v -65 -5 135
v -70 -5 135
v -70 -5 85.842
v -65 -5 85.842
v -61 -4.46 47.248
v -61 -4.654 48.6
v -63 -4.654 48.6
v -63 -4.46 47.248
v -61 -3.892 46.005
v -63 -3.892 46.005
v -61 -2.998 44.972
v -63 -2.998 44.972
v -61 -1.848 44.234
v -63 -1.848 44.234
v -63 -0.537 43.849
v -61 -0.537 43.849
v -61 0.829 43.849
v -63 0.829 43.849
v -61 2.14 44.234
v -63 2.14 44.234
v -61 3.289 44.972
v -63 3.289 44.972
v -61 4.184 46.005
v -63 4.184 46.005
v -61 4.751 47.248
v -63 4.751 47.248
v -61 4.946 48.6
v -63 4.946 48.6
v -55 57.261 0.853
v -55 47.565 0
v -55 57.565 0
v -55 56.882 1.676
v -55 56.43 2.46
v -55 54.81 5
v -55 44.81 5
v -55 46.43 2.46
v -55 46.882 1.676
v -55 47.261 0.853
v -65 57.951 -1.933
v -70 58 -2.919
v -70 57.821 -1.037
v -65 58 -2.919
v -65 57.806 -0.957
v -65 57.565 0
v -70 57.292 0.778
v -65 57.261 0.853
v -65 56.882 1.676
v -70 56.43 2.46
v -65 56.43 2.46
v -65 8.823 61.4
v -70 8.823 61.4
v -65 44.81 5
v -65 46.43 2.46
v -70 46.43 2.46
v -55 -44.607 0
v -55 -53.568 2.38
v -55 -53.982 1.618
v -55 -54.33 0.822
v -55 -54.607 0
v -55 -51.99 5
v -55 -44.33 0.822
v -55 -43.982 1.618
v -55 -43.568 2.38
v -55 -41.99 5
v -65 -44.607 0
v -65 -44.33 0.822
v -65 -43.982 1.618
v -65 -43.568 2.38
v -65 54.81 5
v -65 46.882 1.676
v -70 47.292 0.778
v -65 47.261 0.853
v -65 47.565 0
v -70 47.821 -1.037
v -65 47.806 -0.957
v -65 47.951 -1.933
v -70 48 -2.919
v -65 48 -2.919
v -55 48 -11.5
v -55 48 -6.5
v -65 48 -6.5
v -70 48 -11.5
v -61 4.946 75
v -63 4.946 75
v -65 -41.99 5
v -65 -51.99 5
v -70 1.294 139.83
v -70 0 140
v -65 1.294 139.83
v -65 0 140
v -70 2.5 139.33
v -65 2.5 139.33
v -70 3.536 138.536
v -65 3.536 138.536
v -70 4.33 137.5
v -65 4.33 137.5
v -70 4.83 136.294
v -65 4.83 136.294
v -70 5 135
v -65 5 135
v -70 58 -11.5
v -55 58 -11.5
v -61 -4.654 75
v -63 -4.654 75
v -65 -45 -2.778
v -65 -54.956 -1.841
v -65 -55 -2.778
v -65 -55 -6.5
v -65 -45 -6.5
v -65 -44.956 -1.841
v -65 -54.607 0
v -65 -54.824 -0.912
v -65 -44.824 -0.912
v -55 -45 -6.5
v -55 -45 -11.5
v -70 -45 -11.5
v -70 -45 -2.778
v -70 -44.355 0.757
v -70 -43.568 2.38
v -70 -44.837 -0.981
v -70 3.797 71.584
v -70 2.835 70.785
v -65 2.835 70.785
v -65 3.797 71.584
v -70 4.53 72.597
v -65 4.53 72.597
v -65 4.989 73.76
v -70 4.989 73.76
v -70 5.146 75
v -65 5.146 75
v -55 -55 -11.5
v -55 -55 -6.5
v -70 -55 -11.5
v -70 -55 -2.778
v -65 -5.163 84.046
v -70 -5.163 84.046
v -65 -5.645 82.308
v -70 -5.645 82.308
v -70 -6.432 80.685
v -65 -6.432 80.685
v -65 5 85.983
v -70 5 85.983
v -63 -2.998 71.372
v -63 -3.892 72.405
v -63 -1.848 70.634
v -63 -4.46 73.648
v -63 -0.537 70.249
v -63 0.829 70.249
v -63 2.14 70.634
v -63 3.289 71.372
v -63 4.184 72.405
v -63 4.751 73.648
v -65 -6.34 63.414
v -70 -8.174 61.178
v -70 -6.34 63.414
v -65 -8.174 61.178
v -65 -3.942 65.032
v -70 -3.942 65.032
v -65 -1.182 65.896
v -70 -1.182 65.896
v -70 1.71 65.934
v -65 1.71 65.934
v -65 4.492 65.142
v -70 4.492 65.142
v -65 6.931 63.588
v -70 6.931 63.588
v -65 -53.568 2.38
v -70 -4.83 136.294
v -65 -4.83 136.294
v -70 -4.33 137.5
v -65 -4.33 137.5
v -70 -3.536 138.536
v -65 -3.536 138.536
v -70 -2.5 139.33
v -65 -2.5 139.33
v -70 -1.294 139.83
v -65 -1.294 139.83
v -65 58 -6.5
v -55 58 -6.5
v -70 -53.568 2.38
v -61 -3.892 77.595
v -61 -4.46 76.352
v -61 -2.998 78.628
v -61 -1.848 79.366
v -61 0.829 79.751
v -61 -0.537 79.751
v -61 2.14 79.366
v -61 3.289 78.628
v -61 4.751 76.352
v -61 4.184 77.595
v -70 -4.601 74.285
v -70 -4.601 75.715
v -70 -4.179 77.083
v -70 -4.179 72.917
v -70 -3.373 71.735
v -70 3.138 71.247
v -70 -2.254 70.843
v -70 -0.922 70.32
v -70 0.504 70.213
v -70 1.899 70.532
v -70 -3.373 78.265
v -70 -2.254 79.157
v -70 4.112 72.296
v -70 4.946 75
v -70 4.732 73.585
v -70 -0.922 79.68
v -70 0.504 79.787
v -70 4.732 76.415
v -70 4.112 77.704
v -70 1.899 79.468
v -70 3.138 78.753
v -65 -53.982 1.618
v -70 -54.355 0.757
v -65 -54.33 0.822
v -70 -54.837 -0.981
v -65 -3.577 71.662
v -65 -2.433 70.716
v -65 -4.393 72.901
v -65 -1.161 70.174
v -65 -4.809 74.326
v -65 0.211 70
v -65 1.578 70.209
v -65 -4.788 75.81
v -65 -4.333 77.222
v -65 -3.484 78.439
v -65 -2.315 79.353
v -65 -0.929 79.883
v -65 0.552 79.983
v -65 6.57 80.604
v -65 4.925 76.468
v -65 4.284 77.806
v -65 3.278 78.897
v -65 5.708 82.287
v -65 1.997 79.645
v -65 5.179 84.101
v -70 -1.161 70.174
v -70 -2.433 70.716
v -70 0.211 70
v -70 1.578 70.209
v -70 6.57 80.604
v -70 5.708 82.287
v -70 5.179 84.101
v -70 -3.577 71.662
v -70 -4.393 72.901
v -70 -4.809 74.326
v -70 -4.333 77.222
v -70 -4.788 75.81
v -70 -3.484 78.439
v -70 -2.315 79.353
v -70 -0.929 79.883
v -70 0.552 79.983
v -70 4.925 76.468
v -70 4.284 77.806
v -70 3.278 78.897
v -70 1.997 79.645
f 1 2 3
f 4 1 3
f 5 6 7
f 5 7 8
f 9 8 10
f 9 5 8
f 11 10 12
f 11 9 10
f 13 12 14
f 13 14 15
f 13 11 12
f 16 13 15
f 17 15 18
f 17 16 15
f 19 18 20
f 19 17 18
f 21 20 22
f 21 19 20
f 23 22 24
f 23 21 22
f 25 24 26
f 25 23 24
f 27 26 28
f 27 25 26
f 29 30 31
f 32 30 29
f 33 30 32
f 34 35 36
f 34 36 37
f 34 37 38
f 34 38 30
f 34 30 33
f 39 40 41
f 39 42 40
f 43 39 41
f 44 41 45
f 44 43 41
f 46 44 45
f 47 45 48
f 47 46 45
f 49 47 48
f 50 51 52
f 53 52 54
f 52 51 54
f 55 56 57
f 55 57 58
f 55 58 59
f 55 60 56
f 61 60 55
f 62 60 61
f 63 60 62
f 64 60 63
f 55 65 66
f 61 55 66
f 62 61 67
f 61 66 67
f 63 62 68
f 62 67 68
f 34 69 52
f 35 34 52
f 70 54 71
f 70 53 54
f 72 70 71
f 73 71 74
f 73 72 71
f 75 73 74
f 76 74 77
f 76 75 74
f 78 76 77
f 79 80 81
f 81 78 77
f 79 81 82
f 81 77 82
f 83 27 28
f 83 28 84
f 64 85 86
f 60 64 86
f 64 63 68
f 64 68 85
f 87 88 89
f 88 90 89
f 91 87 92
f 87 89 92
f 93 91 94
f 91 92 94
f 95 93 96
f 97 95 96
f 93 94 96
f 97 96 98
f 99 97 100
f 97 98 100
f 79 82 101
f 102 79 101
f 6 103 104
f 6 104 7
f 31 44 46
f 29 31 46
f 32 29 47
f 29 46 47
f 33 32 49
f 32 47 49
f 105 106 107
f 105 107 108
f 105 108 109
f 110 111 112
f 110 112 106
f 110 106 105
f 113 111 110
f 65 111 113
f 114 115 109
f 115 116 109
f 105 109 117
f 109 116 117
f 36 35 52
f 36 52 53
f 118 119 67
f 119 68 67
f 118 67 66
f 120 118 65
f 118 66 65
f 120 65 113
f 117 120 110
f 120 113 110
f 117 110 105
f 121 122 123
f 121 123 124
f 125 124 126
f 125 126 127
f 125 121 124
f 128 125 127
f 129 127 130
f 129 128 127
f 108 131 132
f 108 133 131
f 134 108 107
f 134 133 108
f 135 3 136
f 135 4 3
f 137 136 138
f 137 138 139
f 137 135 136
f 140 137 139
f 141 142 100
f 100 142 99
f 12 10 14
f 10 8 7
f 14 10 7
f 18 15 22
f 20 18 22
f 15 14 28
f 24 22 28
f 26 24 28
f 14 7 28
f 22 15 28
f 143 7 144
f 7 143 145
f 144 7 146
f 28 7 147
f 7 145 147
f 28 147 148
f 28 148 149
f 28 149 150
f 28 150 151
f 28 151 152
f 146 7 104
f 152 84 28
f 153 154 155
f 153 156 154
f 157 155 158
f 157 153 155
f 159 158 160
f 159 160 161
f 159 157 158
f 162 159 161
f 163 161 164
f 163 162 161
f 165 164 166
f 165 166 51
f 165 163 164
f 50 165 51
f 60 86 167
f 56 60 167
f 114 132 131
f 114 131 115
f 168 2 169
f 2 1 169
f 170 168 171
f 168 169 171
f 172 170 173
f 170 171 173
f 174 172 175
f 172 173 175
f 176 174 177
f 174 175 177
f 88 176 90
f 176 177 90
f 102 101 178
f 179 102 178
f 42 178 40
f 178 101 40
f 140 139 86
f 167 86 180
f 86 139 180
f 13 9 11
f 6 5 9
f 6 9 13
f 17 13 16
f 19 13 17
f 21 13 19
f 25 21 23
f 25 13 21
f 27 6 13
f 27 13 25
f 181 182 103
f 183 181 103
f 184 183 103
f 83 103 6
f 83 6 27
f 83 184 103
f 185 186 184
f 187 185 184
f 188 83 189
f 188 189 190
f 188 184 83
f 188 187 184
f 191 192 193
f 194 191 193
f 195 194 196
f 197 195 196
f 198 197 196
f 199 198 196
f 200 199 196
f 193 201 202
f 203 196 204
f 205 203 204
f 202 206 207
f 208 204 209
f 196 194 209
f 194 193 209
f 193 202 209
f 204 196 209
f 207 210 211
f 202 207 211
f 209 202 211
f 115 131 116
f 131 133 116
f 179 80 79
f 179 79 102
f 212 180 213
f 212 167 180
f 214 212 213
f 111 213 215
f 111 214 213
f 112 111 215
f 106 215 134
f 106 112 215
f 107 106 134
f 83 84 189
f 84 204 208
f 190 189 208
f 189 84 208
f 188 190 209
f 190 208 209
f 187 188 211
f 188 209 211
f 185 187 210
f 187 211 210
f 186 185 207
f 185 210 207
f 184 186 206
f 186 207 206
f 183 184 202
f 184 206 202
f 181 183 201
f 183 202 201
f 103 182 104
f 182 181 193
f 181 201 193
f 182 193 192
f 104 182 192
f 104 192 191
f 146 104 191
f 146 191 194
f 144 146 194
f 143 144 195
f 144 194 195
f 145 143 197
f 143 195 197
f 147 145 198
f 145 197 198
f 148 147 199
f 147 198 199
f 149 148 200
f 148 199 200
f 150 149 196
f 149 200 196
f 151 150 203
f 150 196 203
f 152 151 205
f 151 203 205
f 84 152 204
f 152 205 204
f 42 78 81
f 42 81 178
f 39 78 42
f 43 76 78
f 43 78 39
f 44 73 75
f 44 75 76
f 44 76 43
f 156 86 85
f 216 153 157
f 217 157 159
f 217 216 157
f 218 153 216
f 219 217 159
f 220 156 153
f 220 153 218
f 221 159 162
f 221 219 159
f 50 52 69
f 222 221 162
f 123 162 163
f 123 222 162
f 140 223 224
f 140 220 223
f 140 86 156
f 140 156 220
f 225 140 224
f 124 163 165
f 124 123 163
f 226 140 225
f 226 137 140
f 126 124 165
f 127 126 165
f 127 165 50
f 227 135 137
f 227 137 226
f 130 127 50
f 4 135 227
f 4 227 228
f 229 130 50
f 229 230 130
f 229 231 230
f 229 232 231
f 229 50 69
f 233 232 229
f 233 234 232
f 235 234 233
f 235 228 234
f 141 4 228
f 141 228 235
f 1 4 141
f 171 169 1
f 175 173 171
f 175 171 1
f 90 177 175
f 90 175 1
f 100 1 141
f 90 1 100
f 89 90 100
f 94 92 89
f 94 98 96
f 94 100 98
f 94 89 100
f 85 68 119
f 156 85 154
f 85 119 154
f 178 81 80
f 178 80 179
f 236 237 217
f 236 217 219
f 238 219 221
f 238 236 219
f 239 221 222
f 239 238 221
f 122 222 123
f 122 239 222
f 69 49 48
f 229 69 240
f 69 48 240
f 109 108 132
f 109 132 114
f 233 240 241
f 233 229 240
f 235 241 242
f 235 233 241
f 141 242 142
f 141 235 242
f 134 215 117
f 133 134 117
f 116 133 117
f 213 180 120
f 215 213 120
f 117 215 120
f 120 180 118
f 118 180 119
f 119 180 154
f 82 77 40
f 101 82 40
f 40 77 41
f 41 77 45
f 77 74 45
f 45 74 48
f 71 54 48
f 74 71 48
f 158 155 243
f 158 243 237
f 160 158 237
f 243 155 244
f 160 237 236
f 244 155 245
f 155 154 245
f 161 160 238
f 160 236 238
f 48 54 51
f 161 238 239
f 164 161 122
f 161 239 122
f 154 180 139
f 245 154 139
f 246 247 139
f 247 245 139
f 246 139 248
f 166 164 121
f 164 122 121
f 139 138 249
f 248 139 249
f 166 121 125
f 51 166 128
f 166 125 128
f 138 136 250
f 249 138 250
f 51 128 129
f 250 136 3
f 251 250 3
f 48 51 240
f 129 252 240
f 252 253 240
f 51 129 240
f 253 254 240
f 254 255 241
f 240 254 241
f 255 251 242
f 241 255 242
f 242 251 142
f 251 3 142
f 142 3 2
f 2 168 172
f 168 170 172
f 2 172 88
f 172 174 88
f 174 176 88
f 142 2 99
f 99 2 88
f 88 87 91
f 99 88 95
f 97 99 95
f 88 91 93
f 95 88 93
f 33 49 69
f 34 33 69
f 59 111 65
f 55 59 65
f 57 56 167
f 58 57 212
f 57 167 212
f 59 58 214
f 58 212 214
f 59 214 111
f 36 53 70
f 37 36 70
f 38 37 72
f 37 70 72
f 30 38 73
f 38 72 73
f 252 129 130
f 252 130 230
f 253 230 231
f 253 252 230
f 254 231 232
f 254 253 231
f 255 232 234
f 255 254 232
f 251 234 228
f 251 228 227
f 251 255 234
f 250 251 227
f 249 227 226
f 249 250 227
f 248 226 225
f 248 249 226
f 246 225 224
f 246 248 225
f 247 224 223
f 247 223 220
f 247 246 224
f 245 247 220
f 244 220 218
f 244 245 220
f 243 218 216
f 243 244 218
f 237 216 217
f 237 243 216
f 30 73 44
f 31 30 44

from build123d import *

# Parameters (mm, degrees)
F2_DEPTH  = 5
F3_R      = 10
F4_R      = 4.99999
F5_W      = 10
F5_H      = 5
F6_DEPTH  = 10
F8_DEPTH  = 5
F9_R      = 4.8
F10_DEPTH = 9
F12_DEPTH = 2


# Not quite as in the source:
# - a fillet or chamfer is up to 0.001 mm smaller than in the source, because OpenCascade refuses the exact size


with BuildPart() as f2:
    # F1 (on offset) → F2 (new body)
    with BuildSketch(Plane.YZ.offset(-70)):
        Polygon((-45, 0), (0.145631068, 75), (48, 0), (48, -11.5), (58, -11.5), (58, 0), (5, 83.064516129), (5, 140), (0, 140), (-5, 140), (-5, 83.064516129), (-55, 0), (-55, -11.5), (-45, -11.5), align=None)
    extrude(amount=F2_DEPTH)

    # F3
    f3_edges = [f2.edges().sort_by_distance(p)[0] for p in [
        (-67.5, -55, 0),
        (-67.5, 48, 0),
        (-67.5, 0.145631, 75),
        (-67.5, 5, 83.064516),
        (-67.5, -5, 83.064516),
        (-67.5, 58, 0),
        (-67.5, -45, 0),
    ]]
    fillet(f3_edges, radius=F3_R)

    # F4 (radius 5 in the source; OpenCascade refuses exactly that, so slightly less here)
    f4_edges = [f2.edges().sort_by_distance(p)[0] for p in [
        (-67.5, -5, 140),
        (-67.5, 5, 140),
    ]]
    fillet(f4_edges, radius=F4_R)

    # F5 (on face) → F6 (join)
    with BuildSketch(Plane.YZ.offset(-65)):
        with Locations((-50, -9)):
            Rectangle(F5_W, F5_H)
        with Locations((53, -9)):
            Rectangle(F5_W, F5_H)
        with BuildLine():
            ThreePointArc((-53.5675810852, 2.379663681), (-54.16461993, 1.2236964571), (-54.6065278232, 0))
            Line((-54.6065278232, 0), (-44.6065278232, 0))
            ThreePointArc((-44.6065278232, 0), (-44.16461993, 1.2236964571), (-43.5675810852, 2.379663681))
            Line((-43.5675810852, 2.379663681), (-41.9902912621, 5))
            Line((-41.9902912621, 5), (-51.9902912621, 5))
            Line((-51.9902912621, 5), (-53.5675810852, 2.379663681))
        make_face()
        with BuildLine():
            Line((54.8097087379, 5), (44.8097087379, 5))
            Line((44.8097087379, 5), (46.4301381012, 2.4603739436))
            ThreePointArc((46.4301381012, 2.4603739436), (47.0810932515, 1.2687862909), (47.5646272105, 0))
            Line((47.5646272105, 0), (57.5646272105, 0))
            ThreePointArc((57.5646272105, 0), (57.0810932515, 1.2687862909), (56.4301381012, 2.4603739436))
            Line((56.4301381012, 2.4603739436), (54.8097087379, 5))
        make_face()
    extrude(amount=F6_DEPTH)

    # F7 (on face) → F8 (cut, through all)
    with BuildSketch(Plane.YZ.offset(-70)):
        with BuildLine():
            ThreePointArc((2.8350906603, 70.7849309494), (4.5301092559, 72.5965959517), (5.145631068, 75))
            ThreePointArc((5.145631068, 75), (-2.3147589593, 79.3527555541), (-2.4329612975, 70.7162094574))
            Line((-2.4329612975, 70.7162094574), (0.145631068, 75))
            Line((0.145631068, 75), (2.8350906603, 70.7849309494))
        make_face()
        with BuildLine():
            Line((0.145631068, 75), (-2.4329612975, 70.7162094574))
            ThreePointArc((-2.4329612975, 70.7162094574), (0.2108502857, 70.0004253727), (2.8350906603, 70.7849309494))
            Line((2.8350906603, 70.7849309494), (0.145631068, 75))
        make_face()
    extrude(amount=F8_DEPTH, mode=Mode.SUBTRACT)


with BuildPart() as f10:
    # F9 (on face) → F10 (new body)
    with BuildSketch(Plane.YZ.offset(-70)):
        with Locations((0.145631068, 75)):
            Circle(F9_R)
    extrude(amount=F10_DEPTH)

    # F11 (on face) → F12 (join)
    with BuildSketch(Plane.YZ.offset(-61)):
        with BuildLine():
            Line((4.945631068, 75), (-4.654368932, 75))
            Line((-4.654368932, 75), (-4.654368932, 48.6))
            ThreePointArc((-4.654368932, 48.6), (0.145631068, 53.4), (4.945631068, 48.6))
            Line((4.945631068, 48.6), (4.945631068, 75))
        make_face()
        with BuildLine():
            ThreePointArc((4.945631068, 48.6), (0.145631068, 53.4), (-4.654368932, 48.6))
            Line((-4.654368932, 48.6), (4.945631068, 48.6))
        make_face()
        with BuildLine():
            Line((4.945631068, 48.6), (-4.654368932, 48.6))
            ThreePointArc((-4.654368932, 48.6), (0.145631068, 43.8), (4.945631068, 48.6))
        make_face()
        with BuildLine():
            ThreePointArc((4.945631068, 75), (0.145631068, 79.8), (-4.654368932, 75))
            Line((-4.654368932, 75), (4.945631068, 75))
        make_face()
    extrude(amount=-F12_DEPTH)


solid = Compound([f2.part, f10.part])
